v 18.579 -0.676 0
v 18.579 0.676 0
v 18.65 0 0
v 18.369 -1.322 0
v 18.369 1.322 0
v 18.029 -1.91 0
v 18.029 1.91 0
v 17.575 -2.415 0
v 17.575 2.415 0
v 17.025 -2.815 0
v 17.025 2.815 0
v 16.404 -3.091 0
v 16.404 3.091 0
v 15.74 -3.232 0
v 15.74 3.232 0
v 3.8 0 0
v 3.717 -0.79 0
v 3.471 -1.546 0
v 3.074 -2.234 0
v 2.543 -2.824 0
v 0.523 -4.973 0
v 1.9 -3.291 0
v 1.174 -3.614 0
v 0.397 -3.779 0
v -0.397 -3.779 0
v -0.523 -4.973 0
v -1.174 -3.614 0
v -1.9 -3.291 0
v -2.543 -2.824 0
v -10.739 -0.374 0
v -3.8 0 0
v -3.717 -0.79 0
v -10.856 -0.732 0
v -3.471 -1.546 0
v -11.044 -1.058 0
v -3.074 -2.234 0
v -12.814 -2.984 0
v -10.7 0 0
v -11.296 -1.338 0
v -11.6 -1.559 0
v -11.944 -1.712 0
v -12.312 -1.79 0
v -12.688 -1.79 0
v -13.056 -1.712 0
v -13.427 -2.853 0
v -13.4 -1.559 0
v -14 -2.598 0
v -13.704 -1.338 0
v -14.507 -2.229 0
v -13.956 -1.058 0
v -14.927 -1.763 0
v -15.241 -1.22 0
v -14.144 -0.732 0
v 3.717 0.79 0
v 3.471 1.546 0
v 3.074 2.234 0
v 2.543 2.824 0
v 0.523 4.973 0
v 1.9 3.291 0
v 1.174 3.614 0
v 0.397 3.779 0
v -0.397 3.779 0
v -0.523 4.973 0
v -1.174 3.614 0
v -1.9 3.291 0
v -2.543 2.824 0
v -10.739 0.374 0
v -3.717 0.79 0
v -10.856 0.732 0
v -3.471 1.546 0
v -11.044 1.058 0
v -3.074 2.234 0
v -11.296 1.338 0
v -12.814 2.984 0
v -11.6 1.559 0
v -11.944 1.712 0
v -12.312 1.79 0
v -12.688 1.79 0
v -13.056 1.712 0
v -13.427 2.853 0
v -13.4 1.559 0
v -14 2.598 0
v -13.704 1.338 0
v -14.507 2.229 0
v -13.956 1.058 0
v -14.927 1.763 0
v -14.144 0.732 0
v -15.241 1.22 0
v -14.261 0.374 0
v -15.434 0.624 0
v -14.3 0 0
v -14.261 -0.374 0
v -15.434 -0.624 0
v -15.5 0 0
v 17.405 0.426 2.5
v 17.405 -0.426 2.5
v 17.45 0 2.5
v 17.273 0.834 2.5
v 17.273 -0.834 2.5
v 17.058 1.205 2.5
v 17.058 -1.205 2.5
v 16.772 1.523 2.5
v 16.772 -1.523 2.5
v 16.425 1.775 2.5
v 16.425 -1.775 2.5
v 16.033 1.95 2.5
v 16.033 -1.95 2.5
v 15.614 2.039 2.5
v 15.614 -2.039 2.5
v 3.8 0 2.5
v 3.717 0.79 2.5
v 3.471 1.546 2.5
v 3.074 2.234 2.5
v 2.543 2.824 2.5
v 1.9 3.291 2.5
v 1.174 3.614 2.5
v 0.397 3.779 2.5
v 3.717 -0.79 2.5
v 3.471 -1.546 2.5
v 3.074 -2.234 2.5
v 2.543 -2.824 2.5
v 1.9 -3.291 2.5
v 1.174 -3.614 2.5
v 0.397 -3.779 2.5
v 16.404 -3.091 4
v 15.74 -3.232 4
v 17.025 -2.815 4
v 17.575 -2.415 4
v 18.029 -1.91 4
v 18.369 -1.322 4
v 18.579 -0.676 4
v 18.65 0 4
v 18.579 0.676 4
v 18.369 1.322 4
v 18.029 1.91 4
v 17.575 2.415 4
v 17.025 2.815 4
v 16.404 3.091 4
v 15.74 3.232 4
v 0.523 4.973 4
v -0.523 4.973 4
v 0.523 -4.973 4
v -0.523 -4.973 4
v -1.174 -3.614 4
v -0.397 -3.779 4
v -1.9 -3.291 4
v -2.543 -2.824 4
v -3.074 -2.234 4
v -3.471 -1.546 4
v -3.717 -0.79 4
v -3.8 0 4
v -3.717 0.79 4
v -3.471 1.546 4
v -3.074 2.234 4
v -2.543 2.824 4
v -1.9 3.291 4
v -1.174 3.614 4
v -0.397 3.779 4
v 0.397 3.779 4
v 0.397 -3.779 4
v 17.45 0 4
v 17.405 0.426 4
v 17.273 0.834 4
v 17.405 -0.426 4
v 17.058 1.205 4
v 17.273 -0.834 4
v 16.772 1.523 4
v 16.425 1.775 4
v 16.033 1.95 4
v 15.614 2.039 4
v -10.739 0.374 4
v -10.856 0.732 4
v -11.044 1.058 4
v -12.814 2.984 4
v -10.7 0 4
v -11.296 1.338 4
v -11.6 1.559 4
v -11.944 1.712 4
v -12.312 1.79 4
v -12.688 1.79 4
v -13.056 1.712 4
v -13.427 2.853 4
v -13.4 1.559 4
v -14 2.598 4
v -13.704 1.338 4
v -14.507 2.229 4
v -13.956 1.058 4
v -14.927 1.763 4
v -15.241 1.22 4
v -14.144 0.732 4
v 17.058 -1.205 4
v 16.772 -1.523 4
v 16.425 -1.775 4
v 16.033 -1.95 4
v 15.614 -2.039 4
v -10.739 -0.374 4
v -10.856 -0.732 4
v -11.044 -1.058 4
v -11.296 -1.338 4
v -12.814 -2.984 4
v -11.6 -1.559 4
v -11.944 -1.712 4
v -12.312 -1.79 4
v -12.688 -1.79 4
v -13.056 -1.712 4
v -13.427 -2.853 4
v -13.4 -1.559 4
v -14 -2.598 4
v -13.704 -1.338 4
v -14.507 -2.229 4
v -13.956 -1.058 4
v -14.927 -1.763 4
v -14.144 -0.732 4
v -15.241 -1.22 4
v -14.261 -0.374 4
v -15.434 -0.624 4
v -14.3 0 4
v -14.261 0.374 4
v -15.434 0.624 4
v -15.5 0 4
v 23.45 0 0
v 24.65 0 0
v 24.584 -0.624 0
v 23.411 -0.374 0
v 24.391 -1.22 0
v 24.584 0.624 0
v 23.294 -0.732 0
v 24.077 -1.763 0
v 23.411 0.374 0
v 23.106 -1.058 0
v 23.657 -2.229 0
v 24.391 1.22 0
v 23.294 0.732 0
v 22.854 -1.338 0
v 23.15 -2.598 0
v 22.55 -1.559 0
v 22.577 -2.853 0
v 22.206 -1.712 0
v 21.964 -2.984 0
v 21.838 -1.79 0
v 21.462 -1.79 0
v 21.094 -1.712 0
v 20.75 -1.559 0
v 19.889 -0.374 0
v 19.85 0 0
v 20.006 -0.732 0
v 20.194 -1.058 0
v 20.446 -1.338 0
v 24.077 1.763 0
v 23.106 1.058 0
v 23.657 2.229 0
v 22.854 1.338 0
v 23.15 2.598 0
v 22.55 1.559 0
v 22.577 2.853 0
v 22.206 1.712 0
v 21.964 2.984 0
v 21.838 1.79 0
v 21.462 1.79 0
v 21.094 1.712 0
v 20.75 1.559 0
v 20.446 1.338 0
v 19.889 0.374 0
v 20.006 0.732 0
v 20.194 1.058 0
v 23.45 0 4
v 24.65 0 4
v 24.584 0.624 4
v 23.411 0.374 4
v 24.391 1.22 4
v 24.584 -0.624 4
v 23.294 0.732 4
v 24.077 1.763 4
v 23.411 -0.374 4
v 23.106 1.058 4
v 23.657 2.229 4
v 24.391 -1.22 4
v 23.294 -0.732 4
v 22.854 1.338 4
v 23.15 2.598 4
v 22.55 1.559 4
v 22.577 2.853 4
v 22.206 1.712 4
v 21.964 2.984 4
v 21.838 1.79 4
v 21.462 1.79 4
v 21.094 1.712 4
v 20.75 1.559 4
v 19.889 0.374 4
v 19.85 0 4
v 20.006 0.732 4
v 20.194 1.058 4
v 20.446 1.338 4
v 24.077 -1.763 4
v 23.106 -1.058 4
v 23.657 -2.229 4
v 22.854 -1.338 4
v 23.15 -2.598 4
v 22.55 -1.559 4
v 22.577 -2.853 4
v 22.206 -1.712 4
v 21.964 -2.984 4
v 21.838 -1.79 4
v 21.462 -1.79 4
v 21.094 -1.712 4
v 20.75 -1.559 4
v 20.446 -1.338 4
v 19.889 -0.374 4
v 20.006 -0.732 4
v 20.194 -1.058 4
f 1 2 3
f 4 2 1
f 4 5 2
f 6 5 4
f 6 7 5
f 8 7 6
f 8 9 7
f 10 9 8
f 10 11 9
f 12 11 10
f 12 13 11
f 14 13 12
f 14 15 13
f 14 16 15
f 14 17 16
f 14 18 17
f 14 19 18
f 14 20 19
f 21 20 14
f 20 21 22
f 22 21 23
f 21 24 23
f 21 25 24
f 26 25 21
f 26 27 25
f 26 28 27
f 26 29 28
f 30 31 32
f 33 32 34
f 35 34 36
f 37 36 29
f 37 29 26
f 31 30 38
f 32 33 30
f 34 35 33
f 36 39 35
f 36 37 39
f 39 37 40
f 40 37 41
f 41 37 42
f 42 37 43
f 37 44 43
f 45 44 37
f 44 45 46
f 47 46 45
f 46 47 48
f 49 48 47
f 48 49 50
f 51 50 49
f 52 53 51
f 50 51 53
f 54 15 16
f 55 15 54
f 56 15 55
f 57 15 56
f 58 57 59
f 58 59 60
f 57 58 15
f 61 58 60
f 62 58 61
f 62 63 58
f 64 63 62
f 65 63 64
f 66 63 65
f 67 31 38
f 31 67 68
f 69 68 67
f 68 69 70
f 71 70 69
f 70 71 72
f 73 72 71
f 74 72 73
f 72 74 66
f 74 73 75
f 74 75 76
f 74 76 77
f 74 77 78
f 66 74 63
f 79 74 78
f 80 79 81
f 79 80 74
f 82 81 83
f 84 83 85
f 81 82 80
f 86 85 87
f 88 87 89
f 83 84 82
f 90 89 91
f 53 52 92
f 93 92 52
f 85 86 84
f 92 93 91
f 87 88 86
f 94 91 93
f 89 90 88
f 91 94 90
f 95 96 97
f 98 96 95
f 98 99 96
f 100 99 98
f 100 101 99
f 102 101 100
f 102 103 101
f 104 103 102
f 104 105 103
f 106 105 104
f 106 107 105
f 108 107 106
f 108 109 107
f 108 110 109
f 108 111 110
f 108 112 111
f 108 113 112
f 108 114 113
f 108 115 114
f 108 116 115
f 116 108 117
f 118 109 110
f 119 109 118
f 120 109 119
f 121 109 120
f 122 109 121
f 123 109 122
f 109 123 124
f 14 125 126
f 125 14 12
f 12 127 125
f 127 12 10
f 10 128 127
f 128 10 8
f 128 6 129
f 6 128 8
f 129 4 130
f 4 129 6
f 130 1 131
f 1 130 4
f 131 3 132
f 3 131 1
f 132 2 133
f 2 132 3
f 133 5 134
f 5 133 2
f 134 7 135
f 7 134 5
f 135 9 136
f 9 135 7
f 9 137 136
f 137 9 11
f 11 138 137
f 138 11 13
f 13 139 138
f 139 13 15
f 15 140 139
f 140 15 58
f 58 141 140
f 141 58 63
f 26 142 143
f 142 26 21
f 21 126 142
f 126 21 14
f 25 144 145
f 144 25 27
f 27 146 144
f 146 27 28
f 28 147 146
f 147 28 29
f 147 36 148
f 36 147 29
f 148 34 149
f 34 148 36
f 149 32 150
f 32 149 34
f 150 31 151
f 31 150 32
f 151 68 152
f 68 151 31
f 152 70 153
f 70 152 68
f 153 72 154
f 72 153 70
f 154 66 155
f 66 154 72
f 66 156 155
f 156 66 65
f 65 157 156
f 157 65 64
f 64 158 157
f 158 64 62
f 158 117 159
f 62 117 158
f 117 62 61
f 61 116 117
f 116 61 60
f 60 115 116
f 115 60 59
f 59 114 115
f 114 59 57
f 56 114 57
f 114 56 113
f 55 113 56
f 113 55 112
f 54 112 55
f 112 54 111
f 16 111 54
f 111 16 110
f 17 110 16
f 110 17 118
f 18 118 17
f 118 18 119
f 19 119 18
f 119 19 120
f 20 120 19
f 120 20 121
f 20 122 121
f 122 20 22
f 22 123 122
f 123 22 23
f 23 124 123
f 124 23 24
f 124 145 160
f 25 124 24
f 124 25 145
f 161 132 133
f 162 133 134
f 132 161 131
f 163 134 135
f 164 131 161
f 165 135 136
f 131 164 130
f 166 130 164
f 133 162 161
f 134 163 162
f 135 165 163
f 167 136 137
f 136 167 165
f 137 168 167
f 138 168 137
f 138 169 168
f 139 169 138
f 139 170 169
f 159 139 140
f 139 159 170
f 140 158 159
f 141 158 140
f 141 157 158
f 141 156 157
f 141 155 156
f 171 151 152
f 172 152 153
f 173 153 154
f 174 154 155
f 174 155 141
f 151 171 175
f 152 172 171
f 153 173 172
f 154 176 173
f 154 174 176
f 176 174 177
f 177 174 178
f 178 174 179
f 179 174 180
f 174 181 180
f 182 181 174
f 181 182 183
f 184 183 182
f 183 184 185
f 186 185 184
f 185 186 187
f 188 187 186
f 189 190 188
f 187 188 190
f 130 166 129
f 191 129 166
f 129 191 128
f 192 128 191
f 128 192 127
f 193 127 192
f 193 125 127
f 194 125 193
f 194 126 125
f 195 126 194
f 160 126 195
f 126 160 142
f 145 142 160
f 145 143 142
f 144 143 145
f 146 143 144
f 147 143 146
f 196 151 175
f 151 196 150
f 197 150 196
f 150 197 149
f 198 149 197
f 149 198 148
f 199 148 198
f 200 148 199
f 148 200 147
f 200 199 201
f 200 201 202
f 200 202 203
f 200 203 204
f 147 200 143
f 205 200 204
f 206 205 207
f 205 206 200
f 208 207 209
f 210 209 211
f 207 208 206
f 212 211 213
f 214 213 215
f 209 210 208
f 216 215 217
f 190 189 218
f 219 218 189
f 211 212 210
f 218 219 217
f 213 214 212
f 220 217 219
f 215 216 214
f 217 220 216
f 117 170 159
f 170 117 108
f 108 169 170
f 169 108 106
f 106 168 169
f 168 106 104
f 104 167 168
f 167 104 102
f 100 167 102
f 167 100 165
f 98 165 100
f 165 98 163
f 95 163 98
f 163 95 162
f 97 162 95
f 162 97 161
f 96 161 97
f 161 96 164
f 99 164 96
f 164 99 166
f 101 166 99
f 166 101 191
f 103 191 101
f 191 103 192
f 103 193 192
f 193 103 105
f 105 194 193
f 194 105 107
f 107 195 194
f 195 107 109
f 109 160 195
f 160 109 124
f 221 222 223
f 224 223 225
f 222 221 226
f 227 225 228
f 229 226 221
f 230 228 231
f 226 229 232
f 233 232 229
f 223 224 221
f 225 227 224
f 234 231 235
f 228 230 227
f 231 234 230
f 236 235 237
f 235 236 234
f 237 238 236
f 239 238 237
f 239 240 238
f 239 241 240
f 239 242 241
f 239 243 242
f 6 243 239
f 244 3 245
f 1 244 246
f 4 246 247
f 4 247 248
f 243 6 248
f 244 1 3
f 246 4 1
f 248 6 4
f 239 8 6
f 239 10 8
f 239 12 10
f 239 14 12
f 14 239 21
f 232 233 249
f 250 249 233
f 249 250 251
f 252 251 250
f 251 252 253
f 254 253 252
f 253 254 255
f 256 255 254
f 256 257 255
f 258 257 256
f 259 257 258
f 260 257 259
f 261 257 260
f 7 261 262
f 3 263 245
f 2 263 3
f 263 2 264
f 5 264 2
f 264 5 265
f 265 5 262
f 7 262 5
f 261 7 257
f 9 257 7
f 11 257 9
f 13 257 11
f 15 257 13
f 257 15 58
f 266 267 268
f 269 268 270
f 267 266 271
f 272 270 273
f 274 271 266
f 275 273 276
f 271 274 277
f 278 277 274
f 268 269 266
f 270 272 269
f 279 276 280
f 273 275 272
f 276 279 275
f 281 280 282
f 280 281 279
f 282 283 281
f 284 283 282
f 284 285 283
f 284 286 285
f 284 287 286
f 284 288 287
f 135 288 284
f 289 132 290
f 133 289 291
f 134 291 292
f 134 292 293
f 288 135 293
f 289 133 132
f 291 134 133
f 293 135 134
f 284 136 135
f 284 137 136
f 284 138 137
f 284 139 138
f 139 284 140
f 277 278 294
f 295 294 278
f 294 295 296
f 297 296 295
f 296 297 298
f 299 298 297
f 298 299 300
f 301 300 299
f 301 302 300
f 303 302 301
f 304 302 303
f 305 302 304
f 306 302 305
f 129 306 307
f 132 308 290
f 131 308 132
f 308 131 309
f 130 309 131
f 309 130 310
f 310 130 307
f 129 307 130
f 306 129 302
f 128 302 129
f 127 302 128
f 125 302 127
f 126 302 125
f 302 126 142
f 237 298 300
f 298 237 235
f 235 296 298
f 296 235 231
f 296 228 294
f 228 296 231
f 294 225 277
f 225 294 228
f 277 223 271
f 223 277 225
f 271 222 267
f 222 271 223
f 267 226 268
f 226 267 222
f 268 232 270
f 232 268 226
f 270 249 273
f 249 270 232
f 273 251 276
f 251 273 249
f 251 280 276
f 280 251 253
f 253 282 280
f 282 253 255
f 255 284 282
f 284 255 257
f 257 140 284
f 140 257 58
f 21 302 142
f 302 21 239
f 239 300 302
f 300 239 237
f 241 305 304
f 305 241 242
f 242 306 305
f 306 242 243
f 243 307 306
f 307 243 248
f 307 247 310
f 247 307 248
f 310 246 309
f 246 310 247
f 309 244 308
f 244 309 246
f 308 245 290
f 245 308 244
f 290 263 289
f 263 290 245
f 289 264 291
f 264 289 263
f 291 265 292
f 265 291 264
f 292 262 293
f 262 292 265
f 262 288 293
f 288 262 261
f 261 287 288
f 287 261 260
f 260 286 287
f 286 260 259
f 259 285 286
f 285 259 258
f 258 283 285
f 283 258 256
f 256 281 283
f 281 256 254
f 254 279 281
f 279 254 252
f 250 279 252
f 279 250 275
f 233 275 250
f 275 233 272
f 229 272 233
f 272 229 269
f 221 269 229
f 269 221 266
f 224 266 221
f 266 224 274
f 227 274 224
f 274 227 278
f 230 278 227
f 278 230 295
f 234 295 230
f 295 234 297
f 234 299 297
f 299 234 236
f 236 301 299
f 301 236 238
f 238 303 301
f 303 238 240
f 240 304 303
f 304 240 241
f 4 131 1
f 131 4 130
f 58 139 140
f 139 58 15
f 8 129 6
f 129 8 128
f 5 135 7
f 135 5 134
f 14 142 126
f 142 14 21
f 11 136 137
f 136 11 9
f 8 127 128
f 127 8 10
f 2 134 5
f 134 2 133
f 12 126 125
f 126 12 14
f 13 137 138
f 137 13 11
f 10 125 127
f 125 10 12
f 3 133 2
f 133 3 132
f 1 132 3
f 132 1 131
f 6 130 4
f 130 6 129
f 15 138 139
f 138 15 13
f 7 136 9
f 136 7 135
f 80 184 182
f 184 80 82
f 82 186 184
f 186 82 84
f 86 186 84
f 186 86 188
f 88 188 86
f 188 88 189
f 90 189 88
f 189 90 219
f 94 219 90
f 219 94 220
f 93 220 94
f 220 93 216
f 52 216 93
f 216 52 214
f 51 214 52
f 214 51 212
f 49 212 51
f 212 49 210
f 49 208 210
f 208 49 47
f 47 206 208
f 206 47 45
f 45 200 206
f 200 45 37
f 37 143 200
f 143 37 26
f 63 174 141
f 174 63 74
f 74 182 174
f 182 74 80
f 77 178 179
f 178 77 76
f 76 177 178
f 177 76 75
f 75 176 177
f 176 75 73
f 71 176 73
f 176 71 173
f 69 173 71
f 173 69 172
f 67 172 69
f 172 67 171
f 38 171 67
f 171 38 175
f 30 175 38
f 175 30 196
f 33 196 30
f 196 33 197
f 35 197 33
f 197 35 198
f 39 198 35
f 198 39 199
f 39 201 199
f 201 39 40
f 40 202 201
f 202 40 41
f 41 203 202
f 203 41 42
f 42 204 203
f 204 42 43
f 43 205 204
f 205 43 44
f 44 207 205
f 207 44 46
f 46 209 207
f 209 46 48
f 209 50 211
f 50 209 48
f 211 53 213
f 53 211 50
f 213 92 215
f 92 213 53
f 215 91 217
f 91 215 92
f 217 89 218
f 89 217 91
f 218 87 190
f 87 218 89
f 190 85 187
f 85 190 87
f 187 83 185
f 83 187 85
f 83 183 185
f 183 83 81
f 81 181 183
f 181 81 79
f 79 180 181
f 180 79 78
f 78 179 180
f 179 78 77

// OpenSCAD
// Public variables

// global
h1 = 2.5;
horn_h = 1.5;
horn_rl = 7/2; // horn large radius
tolerance = 0.3;
th = 1.2;

// per arm
horn_c2c = 15.4; // center to center
horn_rs = 3.5/2; // horn small radius


screw_head_th = 2;
screw_head_r = 5/2;
min_screw_dst = screw_head_r + 10;



// screw
screw_r = 3/2;
screw_c2c = horn_c2c+th+horn_rl*2+horn_rs*2+screw_r*2;
screw_tolerance = 0.2;
screw_th = 3; // thickness of the screw holder wings



t = tolerance;
t2 = screw_tolerance;
$fn=30;
module 2d_horn(rs, rl, c2c) {
    hull() {
        circle(r=rl);
        translate([c2c,0,0]) {
            circle(r=rs);
        }
    }
}

module 2d_outer_horn() {
        2d_horn(horn_rs+th+t, horn_rl+th+t, horn_c2c);
}
module outer_horn() {
    linear_extrude(height=h1+horn_h)
    2d_outer_horn();
}

module screw_holder(dst, h) {
    linear_extrude(height=h)
    difference() {
        hull() {
            translate([dst,0,0])
            circle(r=screw_r+th+t);
            circle(r=horn_rl+th+t);
        }
        circle(r=horn_rl+th+t);
        translate([dst,0,0])
        circle(r=screw_r+t);
    }
}


module main_enclosing() {
    linear_extrude(height=h1)
        difference() {
        2d_outer_horn();
        circle(r=horn_rl+t);
    }

    translate([0,0,h1])
    linear_extrude(height=horn_h)
    difference() {
        2d_outer_horn();
        2d_horn(horn_rs+t, horn_rl+t, horn_c2c);
    }
}

module screws() {
    //translate([-(screw_r+th+t + horn_rl+th+t),0,0])
    rotate([0,0,180])
    screw_holder(max(screw_r+th+t + horn_rl+th+t, min_screw_dst), h1+horn_h);

    difference() {
        screw_holder(screw_r+th+t + horn_c2c+horn_rs+th+t, h1+horn_h);
        outer_horn();
    }
}


main_enclosing();
screws();
